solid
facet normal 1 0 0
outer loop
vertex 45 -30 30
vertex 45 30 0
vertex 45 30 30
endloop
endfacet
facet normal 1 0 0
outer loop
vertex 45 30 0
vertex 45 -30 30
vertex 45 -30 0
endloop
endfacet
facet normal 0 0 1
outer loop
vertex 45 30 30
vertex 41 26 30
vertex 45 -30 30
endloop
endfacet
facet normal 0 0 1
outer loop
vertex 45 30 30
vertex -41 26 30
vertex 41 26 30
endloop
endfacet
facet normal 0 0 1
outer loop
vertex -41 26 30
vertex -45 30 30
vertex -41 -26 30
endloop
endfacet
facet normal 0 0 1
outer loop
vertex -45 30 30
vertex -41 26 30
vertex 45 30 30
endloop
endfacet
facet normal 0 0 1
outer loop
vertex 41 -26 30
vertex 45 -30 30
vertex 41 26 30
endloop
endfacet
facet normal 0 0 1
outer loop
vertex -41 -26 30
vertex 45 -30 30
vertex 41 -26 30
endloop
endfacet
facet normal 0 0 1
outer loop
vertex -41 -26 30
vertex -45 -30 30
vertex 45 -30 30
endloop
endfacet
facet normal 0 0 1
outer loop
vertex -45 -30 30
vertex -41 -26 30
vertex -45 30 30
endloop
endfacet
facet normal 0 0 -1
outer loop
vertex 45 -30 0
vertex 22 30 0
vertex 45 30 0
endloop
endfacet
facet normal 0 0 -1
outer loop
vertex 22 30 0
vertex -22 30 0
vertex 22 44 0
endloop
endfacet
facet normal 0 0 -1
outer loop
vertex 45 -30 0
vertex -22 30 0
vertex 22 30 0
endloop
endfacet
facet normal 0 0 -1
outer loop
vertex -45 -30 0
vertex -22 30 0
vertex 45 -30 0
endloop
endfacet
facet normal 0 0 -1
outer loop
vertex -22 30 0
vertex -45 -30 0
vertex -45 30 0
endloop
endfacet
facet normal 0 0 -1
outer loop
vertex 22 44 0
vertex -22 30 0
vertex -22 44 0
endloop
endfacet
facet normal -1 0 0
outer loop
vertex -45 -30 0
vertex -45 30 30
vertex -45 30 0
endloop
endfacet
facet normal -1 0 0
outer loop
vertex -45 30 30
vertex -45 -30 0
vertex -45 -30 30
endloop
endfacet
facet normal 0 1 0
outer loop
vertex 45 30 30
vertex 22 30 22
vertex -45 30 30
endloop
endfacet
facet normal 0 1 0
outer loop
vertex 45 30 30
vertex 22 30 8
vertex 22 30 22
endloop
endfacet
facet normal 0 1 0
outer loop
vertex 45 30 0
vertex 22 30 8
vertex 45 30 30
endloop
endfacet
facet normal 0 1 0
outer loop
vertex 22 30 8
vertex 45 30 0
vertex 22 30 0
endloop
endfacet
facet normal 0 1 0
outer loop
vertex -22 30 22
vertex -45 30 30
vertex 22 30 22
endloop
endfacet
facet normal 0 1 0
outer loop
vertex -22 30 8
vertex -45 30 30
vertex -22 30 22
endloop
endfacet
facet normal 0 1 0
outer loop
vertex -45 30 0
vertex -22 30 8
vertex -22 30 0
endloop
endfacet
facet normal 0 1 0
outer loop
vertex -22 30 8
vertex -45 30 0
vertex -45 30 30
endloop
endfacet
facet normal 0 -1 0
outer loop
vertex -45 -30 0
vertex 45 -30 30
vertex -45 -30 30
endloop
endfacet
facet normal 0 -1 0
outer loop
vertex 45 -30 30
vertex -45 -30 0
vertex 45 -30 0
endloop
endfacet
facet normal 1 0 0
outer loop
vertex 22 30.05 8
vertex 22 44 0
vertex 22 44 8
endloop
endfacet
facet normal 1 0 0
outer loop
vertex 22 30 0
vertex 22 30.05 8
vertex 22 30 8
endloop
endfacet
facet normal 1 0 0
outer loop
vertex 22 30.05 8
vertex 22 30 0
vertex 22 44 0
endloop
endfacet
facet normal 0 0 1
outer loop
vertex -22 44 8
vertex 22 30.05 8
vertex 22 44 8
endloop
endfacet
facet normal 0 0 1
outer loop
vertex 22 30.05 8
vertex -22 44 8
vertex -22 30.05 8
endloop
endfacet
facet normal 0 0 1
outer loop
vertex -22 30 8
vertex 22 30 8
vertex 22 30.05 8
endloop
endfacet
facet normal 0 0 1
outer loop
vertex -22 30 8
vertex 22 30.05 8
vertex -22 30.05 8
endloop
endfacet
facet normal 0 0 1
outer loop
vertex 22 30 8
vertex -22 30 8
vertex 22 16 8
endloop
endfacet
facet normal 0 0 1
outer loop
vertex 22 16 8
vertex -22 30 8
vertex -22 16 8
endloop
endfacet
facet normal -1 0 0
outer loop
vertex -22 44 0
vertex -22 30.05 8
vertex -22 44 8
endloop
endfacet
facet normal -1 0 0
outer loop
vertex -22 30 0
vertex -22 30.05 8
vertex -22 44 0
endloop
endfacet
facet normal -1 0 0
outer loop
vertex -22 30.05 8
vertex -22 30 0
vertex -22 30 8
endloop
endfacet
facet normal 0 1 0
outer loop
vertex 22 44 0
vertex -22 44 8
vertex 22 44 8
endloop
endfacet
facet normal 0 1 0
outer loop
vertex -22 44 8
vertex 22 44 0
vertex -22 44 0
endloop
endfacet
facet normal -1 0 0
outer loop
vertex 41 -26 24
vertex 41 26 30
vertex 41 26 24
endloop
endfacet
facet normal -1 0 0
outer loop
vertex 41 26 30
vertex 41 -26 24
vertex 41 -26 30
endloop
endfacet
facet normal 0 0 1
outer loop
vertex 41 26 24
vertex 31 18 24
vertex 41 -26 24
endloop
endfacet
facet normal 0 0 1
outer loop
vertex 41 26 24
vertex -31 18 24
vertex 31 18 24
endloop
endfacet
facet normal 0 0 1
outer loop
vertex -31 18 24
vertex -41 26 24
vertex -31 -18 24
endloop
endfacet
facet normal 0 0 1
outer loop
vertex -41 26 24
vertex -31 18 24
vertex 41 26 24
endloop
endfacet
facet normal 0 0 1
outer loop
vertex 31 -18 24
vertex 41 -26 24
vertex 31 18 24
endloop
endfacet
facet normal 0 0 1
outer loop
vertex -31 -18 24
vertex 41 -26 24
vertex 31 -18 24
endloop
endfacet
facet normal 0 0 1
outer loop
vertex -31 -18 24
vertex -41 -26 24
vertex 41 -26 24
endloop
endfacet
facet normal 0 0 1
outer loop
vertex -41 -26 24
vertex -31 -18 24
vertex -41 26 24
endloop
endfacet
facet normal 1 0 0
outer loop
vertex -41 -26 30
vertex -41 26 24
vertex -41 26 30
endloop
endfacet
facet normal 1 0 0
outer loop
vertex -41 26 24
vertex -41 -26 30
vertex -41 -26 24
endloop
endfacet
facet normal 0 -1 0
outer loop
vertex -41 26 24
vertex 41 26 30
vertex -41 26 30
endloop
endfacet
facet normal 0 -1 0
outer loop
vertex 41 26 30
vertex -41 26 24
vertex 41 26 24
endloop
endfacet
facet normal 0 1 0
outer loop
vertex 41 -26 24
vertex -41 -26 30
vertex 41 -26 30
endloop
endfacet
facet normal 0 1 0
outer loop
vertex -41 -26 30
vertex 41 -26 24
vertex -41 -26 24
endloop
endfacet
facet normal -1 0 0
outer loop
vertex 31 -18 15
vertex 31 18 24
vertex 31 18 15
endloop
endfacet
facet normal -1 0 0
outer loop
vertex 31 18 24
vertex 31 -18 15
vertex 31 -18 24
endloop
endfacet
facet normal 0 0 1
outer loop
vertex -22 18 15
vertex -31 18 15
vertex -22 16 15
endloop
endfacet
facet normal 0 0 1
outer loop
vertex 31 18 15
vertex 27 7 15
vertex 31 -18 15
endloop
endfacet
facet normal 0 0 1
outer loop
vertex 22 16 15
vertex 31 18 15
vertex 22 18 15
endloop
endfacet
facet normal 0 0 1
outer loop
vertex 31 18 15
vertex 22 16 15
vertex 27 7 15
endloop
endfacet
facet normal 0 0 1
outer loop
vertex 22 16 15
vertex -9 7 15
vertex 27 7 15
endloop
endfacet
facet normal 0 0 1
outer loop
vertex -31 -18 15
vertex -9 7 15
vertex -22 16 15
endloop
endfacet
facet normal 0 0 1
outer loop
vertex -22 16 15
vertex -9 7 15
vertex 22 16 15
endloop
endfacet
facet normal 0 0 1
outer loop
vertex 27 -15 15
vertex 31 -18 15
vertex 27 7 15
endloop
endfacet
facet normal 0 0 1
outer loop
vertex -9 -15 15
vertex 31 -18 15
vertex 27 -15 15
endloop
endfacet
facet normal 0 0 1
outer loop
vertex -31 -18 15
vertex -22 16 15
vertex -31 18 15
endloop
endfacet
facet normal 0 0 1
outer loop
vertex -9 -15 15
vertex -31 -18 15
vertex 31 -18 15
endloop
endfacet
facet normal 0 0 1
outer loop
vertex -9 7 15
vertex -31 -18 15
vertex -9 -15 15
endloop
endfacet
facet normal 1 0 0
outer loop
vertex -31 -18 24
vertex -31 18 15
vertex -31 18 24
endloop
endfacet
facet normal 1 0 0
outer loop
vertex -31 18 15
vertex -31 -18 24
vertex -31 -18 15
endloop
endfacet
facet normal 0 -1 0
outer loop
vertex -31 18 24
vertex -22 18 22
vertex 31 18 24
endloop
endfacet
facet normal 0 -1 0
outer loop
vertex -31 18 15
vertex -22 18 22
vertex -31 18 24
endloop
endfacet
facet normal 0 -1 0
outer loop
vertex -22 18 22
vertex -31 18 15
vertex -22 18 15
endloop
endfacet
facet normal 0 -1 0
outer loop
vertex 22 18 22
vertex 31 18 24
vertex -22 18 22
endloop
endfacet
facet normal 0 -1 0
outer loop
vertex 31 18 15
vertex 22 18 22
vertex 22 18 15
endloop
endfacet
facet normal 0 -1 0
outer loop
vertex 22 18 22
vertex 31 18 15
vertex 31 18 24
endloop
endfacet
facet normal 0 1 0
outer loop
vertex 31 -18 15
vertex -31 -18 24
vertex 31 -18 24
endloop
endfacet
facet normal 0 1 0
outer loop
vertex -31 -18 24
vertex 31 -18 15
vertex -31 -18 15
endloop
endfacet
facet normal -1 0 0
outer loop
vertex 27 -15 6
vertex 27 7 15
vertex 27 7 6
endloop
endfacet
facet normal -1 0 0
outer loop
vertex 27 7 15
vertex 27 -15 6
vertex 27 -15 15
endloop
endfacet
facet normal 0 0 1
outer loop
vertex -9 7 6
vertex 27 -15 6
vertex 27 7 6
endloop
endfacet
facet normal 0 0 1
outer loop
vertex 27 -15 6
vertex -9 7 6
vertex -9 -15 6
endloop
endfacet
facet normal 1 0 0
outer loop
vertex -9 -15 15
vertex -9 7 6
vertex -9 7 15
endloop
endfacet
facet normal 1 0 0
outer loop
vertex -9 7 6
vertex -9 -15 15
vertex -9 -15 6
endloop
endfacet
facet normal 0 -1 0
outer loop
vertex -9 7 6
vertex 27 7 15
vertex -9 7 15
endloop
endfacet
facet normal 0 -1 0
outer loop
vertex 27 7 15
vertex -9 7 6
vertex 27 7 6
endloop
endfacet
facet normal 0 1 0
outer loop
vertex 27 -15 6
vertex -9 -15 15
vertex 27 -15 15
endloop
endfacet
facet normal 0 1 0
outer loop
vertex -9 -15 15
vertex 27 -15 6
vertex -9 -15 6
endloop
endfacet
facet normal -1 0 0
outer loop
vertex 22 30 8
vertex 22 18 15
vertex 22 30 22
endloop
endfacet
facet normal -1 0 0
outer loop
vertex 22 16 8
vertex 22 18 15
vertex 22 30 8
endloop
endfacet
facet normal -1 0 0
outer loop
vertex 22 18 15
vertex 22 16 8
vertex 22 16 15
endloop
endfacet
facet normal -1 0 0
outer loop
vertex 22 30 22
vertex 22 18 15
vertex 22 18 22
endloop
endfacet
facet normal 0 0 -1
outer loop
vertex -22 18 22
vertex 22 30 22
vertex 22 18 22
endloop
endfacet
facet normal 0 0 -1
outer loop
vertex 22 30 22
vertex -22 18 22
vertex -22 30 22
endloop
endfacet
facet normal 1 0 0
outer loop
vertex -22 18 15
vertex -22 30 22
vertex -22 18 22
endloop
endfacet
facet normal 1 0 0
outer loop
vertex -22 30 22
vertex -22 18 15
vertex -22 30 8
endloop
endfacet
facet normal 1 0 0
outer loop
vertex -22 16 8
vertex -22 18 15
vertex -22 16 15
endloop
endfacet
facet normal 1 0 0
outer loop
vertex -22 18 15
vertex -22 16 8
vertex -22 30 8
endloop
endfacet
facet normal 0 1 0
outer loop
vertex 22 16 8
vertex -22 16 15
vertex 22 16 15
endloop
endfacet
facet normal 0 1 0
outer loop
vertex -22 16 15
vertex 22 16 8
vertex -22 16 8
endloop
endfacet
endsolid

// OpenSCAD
// Parameters
$fn = 64;
eps = 0.05;

// Main body
body_length = 90;
body_width = 60;
body_height = 30;

// Top stepped cavity
rim_thickness = 4;
upper_recess_length = body_length - 2 * rim_thickness;
upper_recess_width = body_width - 2 * rim_thickness;
upper_recess_depth = 6;

middle_recess_length = 62;
middle_recess_width = 36;
middle_recess_depth = 15;

deep_recess_length = 36;
deep_recess_width = 22;
deep_recess_depth = 24;
deep_recess_offset_x = 9;
deep_recess_offset_y = -4;

// Side projection
projection_length = 44;
projection_depth = 14;
projection_height = 8;
projection_offset_x = 0;
projection_side = 1; // +Y side

// Side recess above projection
side_recess_length = projection_length;
side_recess_depth = 14;
side_recess_bottom_z = projection_height;
side_recess_height = 14;
side_recess_offset_x = projection_offset_x;

// Helpers
function top_cut_z(depth) = body_height - depth / 2 + eps / 2;

// Base rectangular body
module main_body() {
    translate([0, 0, body_height / 2])
        cube([body_length, body_width, body_height], center=true);
}

// Added side projection
module side_projection() {
    translate([
        projection_offset_x,
        projection_side * (body_width / 2 + projection_depth / 2 - eps / 2),
        projection_height / 2
    ])
        cube([projection_length, projection_depth + eps, projection_height], center=true);
}

// Rectangular cut made downward from the top
module top_rect_cut(length, width, depth, offset_x=0, offset_y=0) {
    translate([offset_x, offset_y, top_cut_z(depth)])
        cube([length, width, depth + eps], center=true);
}

// Rectangular side recess cut above the projection
module side_recess_cut() {
    translate([
        side_recess_offset_x,
        projection_side * (body_width / 2 - side_recess_depth / 2 + eps / 2),
        side_recess_bottom_z + side_recess_height / 2
    ])
        cube([side_recess_length, side_recess_depth + eps, side_recess_height], center=true);
}

// Solid blank before cuts
module solid_blank() {
    union() {
        main_body();
        side_projection();
    }
}

// Nested stepped cavity cuts
module stepped_cavity_cuts() {
    top_rect_cut(upper_recess_length, upper_recess_width, upper_recess_depth);
    top_rect_cut(middle_recess_length, middle_recess_width, middle_recess_depth);
    top_rect_cut(
        deep_recess_length,
        deep_recess_width,
        deep_recess_depth,
        deep_recess_offset_x,
        deep_recess_offset_y
    );
}

// Final model
difference() {
    solid_blank();

    // Top nested stepped cavity
    stepped_cavity_cuts();

    // Side recess tier above projection
    side_recess_cut();
}
